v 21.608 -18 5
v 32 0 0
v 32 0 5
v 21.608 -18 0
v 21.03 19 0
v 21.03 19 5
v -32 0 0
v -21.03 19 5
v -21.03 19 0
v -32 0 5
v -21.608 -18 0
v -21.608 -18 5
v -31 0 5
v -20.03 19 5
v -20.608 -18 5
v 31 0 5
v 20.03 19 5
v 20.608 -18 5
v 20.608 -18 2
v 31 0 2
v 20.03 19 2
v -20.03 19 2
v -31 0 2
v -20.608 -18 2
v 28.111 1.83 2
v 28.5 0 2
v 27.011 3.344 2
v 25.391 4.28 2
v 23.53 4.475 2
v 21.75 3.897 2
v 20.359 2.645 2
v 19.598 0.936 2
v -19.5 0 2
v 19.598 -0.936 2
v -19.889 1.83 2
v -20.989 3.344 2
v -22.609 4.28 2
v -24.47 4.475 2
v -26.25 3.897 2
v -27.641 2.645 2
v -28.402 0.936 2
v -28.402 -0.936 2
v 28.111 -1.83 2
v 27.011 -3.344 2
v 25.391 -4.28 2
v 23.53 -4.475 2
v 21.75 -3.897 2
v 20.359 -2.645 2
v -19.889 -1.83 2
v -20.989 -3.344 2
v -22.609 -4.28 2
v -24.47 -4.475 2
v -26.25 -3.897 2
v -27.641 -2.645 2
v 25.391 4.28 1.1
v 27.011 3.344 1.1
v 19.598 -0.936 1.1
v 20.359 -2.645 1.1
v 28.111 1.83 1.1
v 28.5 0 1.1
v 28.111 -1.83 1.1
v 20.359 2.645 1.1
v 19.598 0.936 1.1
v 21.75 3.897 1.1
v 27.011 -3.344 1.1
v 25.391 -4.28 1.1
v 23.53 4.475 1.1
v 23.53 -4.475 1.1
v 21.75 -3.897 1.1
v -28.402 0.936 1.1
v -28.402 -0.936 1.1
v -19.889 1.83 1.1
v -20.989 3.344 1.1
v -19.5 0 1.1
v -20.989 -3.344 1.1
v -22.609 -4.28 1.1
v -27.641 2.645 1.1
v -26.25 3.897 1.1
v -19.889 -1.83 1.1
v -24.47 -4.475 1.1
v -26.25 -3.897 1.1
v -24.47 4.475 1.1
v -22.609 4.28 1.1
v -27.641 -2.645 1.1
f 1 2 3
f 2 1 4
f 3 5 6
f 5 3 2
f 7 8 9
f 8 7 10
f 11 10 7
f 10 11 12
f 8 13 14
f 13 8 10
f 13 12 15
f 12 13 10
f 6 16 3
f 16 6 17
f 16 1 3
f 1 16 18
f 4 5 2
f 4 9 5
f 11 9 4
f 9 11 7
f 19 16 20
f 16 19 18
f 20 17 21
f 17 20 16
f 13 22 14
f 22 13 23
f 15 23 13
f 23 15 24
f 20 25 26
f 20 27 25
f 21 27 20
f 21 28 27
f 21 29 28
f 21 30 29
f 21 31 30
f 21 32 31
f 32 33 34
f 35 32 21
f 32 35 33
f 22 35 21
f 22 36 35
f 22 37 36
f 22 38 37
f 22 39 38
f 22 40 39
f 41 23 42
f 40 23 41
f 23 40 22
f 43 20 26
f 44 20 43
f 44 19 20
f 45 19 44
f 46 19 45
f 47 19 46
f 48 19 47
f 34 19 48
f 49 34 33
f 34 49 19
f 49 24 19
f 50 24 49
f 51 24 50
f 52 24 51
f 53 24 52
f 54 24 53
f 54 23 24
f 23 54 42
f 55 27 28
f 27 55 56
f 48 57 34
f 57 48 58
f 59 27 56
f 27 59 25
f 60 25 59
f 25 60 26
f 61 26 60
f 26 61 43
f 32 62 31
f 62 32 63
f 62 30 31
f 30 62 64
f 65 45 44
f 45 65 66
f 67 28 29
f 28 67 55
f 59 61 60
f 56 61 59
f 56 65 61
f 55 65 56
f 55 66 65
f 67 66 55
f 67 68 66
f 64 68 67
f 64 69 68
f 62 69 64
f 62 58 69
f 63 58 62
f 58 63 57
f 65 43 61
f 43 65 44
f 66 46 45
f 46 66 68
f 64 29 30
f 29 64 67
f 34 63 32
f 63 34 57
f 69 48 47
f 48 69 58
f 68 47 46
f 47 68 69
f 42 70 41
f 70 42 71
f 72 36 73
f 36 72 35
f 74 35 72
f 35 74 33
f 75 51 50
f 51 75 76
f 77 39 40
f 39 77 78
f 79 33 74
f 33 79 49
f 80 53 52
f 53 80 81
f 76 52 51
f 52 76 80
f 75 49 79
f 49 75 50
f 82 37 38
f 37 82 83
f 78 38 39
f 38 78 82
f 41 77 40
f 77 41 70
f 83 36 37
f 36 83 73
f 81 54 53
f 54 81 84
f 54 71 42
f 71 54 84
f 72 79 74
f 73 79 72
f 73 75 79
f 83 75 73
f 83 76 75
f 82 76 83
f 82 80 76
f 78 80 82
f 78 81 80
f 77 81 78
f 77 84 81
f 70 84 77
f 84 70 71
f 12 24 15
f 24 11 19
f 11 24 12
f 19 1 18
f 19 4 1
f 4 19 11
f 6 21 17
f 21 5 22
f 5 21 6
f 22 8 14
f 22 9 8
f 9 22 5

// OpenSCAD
//TODO: Get this diameter
magnetDiameter = 9;
//TODO: Get this height
magnetHeight = .9;

hexDiameter = 45;
outerHexDiameterPadding = 17;
hexPileHeight = 3;
floorThickness = 2;
actualDiameter = hexDiameter + outerHexDiameterPadding;
actualOuterHexDiameterPadding = 2;

difference()
{
    
    cylinder(h=hexPileHeight + floorThickness, d=actualDiameter + actualOuterHexDiameterPadding, $fn=6);
    translate([0, 0, floorThickness])
        cylinder(h=hexPileHeight, d=actualDiameter, $fn=6);
    translate([(hexDiameter)/2 + magnetDiameter/2 - 3, 0, floorThickness - magnetHeight])
        cylinder(h=magnetHeight, d=magnetDiameter);  
    translate([-(hexDiameter)/2 -magnetDiameter/2 + 3, 0, floorThickness - magnetHeight])
        cylinder(h=magnetHeight, d=magnetDiameter);
    translate([-25, -35, 0])
        cube([(hexDiameter + outerHexDiameterPadding) / 2 + 20, outerHexDiameterPadding, hexPileHeight + floorThickness]);
    translate([-25, 19, 0])
        cube([(hexDiameter + outerHexDiameterPadding) / 2 + 20, outerHexDiameterPadding, hexPileHeight + floorThickness]);
 
}
    
 
       
